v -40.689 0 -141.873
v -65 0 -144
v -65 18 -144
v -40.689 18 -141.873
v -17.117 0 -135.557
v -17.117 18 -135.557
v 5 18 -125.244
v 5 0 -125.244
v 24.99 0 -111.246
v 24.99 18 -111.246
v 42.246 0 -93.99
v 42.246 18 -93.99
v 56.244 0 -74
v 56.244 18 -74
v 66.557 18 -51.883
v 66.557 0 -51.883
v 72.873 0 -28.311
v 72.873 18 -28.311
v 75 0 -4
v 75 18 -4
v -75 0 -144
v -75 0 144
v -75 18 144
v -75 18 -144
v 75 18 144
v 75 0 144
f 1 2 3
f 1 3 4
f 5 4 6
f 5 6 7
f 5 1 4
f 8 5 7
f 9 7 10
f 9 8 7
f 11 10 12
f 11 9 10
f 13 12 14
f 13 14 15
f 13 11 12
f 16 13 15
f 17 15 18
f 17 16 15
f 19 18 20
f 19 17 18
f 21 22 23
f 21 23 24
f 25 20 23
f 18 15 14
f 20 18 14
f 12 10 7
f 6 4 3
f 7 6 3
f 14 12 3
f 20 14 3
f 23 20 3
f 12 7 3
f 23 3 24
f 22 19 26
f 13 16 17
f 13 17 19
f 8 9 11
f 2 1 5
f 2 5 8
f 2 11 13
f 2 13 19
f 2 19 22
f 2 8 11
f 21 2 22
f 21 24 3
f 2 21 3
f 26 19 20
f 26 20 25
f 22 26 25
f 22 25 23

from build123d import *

# Parameters (mm, degrees)
BOSS_EXTRUDE1_DEPTH = 18


with BuildPart() as part:
    # Sketch1 → Boss-Extrude1 (new body)
    with BuildSketch(Plane(origin=(0, 0, 0), x_dir=(1, 0, 0), z_dir=(0, 1, 0))):
        with BuildLine():
            Line((75, -144), (-75, -144))
            Line((-75, -144), (-75, 144))
            Line((-75, 144), (-65, 144))
            ThreePointArc((-65, 144), (33.994949366, 102.994949366), (75, 4))
            Line((75, 4), (75, -144))
        make_face()
    extrude(amount=BOSS_EXTRUDE1_DEPTH)


solid = part.part
